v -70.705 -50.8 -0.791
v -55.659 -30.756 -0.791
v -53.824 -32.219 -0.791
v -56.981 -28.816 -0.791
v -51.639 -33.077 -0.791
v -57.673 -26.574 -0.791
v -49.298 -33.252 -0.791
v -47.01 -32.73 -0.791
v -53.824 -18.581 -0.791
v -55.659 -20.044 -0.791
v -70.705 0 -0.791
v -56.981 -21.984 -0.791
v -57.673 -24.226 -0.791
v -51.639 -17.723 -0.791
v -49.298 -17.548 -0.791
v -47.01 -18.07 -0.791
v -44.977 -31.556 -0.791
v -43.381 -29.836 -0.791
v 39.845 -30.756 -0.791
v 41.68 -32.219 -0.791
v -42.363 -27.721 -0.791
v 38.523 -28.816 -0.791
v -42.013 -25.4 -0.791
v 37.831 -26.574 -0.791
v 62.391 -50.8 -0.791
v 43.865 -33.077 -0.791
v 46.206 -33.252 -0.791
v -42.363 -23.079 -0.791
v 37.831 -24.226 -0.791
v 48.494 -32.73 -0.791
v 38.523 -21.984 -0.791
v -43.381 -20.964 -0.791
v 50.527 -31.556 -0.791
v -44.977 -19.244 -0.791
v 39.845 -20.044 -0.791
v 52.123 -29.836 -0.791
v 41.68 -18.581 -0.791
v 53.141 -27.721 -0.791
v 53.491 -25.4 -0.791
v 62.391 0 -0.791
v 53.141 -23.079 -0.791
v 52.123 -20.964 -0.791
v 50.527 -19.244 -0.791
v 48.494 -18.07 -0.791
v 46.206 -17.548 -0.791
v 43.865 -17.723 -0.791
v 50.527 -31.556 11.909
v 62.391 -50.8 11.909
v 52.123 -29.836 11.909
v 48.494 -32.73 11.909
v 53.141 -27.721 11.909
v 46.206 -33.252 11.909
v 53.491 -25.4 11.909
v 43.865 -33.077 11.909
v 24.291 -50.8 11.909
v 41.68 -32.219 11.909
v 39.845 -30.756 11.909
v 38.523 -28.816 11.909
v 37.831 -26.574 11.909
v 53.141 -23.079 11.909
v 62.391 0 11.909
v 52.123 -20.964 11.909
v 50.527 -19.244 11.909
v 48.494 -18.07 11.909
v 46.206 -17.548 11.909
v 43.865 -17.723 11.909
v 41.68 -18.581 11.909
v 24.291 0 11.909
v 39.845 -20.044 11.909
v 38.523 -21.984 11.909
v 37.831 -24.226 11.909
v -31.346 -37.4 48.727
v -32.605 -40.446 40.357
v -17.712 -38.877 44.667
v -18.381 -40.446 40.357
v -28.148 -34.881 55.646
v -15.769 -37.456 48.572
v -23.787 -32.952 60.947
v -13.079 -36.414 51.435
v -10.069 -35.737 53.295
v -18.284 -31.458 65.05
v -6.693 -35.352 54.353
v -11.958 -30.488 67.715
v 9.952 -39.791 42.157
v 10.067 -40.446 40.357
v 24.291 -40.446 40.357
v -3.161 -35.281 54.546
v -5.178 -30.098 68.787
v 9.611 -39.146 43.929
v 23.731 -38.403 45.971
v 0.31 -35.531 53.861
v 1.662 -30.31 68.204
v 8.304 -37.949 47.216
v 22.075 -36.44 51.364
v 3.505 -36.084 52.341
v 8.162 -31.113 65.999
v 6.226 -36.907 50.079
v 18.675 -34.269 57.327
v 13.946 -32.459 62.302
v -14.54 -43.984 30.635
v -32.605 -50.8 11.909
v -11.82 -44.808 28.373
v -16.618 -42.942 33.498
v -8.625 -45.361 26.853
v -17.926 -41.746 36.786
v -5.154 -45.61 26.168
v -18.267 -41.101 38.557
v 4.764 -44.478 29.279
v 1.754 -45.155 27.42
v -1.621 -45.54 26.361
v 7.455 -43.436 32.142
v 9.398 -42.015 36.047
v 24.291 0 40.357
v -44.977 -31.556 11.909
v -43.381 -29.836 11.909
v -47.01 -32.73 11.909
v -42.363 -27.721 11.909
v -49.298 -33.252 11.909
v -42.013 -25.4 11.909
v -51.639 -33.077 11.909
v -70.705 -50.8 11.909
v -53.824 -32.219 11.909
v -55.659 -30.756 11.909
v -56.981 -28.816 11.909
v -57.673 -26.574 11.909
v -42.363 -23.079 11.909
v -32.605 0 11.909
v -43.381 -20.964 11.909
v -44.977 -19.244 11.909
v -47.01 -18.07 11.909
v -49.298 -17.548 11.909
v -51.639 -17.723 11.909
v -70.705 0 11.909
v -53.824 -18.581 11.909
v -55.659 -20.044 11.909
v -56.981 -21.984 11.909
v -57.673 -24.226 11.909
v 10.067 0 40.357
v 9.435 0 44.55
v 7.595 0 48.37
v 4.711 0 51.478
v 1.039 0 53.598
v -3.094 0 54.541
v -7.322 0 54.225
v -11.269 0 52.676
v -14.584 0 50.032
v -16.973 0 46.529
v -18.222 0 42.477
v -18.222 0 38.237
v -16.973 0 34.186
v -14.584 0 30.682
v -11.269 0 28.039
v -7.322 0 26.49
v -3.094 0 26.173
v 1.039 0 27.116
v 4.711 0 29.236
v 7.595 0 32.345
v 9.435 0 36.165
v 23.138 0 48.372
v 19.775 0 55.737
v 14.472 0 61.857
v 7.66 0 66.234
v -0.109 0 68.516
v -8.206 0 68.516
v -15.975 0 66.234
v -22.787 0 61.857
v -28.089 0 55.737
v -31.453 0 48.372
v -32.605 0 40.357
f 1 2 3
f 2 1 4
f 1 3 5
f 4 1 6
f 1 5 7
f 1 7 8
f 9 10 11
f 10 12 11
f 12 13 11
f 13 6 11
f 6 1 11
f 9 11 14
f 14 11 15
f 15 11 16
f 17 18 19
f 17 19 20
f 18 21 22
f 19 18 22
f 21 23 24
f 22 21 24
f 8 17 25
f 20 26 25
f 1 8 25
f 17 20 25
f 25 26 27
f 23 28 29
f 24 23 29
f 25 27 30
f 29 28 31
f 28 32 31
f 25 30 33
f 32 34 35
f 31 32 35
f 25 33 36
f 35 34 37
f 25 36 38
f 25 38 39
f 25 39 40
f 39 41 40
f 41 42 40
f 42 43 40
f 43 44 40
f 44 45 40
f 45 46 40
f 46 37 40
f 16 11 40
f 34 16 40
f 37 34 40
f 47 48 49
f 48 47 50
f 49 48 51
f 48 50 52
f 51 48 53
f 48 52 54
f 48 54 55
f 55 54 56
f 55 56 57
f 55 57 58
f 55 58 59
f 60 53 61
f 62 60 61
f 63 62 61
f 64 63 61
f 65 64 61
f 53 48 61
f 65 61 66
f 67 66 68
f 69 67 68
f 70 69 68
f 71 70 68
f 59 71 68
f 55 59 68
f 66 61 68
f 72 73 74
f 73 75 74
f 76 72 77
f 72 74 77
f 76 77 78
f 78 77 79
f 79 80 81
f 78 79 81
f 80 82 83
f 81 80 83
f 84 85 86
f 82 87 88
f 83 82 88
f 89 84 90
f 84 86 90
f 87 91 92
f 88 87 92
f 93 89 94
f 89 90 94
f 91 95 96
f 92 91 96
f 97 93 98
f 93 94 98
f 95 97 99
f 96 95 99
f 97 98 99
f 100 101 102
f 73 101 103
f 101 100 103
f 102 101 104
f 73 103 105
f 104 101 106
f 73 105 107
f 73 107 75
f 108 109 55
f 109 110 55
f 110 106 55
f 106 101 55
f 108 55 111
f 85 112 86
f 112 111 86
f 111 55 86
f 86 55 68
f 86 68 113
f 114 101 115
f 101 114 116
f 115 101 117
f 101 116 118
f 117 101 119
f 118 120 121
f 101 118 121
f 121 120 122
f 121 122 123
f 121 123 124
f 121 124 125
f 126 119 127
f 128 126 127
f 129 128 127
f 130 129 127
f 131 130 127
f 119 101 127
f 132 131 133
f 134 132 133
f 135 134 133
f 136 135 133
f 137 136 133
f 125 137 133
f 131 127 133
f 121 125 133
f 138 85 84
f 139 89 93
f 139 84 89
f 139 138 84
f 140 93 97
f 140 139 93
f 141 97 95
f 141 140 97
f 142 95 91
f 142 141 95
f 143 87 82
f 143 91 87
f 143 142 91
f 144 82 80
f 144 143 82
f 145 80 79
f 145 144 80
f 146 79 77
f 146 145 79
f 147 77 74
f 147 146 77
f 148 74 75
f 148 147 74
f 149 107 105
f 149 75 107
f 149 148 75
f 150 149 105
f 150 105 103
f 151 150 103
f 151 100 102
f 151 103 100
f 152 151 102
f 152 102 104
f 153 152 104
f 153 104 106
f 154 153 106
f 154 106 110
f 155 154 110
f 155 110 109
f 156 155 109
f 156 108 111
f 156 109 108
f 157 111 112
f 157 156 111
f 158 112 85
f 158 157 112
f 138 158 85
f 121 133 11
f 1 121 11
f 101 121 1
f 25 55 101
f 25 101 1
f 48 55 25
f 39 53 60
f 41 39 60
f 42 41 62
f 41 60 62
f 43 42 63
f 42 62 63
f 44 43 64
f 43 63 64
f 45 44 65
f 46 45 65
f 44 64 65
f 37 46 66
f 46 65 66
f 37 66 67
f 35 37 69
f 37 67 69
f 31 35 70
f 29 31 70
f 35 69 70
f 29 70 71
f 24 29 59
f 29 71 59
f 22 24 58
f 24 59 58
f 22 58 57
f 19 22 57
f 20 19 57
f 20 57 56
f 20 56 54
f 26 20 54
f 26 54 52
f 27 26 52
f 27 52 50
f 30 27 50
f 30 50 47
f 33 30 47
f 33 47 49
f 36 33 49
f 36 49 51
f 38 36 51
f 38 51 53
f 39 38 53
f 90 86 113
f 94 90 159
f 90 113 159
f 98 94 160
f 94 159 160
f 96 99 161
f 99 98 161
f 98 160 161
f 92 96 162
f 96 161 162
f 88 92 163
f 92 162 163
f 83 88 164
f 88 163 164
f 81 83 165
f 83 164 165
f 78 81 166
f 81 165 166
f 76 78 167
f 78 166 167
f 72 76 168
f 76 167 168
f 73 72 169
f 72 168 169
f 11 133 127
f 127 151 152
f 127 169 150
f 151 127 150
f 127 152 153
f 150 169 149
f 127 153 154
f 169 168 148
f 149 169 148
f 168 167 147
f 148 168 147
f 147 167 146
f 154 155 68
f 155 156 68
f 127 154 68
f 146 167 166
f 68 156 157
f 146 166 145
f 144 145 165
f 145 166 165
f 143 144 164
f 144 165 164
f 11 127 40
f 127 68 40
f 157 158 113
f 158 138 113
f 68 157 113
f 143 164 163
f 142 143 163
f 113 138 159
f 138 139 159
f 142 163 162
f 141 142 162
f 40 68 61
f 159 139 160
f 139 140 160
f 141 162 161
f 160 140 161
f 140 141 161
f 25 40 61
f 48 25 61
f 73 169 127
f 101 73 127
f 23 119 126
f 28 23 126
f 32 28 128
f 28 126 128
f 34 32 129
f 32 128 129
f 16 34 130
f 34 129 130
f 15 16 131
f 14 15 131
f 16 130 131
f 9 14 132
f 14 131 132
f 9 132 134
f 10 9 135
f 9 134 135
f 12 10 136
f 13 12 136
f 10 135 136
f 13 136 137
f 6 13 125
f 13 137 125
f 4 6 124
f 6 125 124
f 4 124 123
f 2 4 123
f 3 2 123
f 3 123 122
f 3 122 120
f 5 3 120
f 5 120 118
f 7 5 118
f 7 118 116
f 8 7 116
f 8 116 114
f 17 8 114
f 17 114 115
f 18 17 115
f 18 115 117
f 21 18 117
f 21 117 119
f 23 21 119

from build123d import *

# Parameters (mm, degrees)
F0_R     = 14.224
F1_DEPTH = 50.8
F3_DEPTH = 177.8
F4_R     = 7.874
F5_DEPTH = 25.4


with BuildPart() as f1:
    # F0 (on Front) → F1 (new body)
    with BuildSketch(Plane.XZ):
        Polygon((-32.6052582374, 11.9092461534), (-70.7052582374, 11.9092461534), (-70.7052582374, -0.7907538466), (62.3907417626, -0.7907538466), (62.3907417626, 11.9092461534), (24.2907417626, 11.9092461534), align=None)
        with BuildLine():
            Line((-32.6052582374, 14.9572461534), (-32.6052582374, 11.9092461534))
            Line((-32.6052582374, 11.9092461534), (24.2907417626, 11.9092461534))
            Line((24.2907417626, 11.9092461534), (24.2907417626, 14.9572461534))
            Line((24.2907417626, 14.9572461534), (24.2907417626, 40.3572461534))
            ThreePointArc((24.2907417626, 40.3572461534), (-4.1572582374, 68.8052461534), (-32.6052582374, 40.3572461534))
            Line((-32.6052582374, 40.3572461534), (-32.6052582374, 14.9572461534))
        make_face()
        with Locations((-4.1572582374, 40.3572461534)):
            Circle(F0_R, mode=Mode.SUBTRACT)
    extrude(amount=F1_DEPTH)

    # F2 (on face) → F3 (cut)
    with BuildSketch(Plane.YZ.offset(24.2907417626)):
        Polygon((-50.8, 68.8053369522), (-30.0915165031, 68.8053369522), (-28.7422632826, 72.5123797086), (-50.8, 72.5123797086), align=None)
        Polygon((-50.8, 40.3572461534), (-50.8, 11.9092461534), (-40.4457747756, 40.3572461534), align=None)
        Polygon((-50.8, 40.3572461534), (-40.4457747756, 40.3572461534), (-30.0915165031, 68.8053369522), (-50.8, 68.8053369522), align=None)
    extrude(amount=-F3_DEPTH, mode=Mode.SUBTRACT)

    # F4 (on face) → F5 (cut)
    with BuildSketch(Plane.XY.offset(11.9092461534)):
        with Locations((-49.8867883899, -25.4)):
            Circle(F4_R)
        with Locations((45.6172116101, -25.4)):
            Circle(F4_R)
    extrude(amount=-F5_DEPTH, mode=Mode.SUBTRACT)


solid = f1.part
